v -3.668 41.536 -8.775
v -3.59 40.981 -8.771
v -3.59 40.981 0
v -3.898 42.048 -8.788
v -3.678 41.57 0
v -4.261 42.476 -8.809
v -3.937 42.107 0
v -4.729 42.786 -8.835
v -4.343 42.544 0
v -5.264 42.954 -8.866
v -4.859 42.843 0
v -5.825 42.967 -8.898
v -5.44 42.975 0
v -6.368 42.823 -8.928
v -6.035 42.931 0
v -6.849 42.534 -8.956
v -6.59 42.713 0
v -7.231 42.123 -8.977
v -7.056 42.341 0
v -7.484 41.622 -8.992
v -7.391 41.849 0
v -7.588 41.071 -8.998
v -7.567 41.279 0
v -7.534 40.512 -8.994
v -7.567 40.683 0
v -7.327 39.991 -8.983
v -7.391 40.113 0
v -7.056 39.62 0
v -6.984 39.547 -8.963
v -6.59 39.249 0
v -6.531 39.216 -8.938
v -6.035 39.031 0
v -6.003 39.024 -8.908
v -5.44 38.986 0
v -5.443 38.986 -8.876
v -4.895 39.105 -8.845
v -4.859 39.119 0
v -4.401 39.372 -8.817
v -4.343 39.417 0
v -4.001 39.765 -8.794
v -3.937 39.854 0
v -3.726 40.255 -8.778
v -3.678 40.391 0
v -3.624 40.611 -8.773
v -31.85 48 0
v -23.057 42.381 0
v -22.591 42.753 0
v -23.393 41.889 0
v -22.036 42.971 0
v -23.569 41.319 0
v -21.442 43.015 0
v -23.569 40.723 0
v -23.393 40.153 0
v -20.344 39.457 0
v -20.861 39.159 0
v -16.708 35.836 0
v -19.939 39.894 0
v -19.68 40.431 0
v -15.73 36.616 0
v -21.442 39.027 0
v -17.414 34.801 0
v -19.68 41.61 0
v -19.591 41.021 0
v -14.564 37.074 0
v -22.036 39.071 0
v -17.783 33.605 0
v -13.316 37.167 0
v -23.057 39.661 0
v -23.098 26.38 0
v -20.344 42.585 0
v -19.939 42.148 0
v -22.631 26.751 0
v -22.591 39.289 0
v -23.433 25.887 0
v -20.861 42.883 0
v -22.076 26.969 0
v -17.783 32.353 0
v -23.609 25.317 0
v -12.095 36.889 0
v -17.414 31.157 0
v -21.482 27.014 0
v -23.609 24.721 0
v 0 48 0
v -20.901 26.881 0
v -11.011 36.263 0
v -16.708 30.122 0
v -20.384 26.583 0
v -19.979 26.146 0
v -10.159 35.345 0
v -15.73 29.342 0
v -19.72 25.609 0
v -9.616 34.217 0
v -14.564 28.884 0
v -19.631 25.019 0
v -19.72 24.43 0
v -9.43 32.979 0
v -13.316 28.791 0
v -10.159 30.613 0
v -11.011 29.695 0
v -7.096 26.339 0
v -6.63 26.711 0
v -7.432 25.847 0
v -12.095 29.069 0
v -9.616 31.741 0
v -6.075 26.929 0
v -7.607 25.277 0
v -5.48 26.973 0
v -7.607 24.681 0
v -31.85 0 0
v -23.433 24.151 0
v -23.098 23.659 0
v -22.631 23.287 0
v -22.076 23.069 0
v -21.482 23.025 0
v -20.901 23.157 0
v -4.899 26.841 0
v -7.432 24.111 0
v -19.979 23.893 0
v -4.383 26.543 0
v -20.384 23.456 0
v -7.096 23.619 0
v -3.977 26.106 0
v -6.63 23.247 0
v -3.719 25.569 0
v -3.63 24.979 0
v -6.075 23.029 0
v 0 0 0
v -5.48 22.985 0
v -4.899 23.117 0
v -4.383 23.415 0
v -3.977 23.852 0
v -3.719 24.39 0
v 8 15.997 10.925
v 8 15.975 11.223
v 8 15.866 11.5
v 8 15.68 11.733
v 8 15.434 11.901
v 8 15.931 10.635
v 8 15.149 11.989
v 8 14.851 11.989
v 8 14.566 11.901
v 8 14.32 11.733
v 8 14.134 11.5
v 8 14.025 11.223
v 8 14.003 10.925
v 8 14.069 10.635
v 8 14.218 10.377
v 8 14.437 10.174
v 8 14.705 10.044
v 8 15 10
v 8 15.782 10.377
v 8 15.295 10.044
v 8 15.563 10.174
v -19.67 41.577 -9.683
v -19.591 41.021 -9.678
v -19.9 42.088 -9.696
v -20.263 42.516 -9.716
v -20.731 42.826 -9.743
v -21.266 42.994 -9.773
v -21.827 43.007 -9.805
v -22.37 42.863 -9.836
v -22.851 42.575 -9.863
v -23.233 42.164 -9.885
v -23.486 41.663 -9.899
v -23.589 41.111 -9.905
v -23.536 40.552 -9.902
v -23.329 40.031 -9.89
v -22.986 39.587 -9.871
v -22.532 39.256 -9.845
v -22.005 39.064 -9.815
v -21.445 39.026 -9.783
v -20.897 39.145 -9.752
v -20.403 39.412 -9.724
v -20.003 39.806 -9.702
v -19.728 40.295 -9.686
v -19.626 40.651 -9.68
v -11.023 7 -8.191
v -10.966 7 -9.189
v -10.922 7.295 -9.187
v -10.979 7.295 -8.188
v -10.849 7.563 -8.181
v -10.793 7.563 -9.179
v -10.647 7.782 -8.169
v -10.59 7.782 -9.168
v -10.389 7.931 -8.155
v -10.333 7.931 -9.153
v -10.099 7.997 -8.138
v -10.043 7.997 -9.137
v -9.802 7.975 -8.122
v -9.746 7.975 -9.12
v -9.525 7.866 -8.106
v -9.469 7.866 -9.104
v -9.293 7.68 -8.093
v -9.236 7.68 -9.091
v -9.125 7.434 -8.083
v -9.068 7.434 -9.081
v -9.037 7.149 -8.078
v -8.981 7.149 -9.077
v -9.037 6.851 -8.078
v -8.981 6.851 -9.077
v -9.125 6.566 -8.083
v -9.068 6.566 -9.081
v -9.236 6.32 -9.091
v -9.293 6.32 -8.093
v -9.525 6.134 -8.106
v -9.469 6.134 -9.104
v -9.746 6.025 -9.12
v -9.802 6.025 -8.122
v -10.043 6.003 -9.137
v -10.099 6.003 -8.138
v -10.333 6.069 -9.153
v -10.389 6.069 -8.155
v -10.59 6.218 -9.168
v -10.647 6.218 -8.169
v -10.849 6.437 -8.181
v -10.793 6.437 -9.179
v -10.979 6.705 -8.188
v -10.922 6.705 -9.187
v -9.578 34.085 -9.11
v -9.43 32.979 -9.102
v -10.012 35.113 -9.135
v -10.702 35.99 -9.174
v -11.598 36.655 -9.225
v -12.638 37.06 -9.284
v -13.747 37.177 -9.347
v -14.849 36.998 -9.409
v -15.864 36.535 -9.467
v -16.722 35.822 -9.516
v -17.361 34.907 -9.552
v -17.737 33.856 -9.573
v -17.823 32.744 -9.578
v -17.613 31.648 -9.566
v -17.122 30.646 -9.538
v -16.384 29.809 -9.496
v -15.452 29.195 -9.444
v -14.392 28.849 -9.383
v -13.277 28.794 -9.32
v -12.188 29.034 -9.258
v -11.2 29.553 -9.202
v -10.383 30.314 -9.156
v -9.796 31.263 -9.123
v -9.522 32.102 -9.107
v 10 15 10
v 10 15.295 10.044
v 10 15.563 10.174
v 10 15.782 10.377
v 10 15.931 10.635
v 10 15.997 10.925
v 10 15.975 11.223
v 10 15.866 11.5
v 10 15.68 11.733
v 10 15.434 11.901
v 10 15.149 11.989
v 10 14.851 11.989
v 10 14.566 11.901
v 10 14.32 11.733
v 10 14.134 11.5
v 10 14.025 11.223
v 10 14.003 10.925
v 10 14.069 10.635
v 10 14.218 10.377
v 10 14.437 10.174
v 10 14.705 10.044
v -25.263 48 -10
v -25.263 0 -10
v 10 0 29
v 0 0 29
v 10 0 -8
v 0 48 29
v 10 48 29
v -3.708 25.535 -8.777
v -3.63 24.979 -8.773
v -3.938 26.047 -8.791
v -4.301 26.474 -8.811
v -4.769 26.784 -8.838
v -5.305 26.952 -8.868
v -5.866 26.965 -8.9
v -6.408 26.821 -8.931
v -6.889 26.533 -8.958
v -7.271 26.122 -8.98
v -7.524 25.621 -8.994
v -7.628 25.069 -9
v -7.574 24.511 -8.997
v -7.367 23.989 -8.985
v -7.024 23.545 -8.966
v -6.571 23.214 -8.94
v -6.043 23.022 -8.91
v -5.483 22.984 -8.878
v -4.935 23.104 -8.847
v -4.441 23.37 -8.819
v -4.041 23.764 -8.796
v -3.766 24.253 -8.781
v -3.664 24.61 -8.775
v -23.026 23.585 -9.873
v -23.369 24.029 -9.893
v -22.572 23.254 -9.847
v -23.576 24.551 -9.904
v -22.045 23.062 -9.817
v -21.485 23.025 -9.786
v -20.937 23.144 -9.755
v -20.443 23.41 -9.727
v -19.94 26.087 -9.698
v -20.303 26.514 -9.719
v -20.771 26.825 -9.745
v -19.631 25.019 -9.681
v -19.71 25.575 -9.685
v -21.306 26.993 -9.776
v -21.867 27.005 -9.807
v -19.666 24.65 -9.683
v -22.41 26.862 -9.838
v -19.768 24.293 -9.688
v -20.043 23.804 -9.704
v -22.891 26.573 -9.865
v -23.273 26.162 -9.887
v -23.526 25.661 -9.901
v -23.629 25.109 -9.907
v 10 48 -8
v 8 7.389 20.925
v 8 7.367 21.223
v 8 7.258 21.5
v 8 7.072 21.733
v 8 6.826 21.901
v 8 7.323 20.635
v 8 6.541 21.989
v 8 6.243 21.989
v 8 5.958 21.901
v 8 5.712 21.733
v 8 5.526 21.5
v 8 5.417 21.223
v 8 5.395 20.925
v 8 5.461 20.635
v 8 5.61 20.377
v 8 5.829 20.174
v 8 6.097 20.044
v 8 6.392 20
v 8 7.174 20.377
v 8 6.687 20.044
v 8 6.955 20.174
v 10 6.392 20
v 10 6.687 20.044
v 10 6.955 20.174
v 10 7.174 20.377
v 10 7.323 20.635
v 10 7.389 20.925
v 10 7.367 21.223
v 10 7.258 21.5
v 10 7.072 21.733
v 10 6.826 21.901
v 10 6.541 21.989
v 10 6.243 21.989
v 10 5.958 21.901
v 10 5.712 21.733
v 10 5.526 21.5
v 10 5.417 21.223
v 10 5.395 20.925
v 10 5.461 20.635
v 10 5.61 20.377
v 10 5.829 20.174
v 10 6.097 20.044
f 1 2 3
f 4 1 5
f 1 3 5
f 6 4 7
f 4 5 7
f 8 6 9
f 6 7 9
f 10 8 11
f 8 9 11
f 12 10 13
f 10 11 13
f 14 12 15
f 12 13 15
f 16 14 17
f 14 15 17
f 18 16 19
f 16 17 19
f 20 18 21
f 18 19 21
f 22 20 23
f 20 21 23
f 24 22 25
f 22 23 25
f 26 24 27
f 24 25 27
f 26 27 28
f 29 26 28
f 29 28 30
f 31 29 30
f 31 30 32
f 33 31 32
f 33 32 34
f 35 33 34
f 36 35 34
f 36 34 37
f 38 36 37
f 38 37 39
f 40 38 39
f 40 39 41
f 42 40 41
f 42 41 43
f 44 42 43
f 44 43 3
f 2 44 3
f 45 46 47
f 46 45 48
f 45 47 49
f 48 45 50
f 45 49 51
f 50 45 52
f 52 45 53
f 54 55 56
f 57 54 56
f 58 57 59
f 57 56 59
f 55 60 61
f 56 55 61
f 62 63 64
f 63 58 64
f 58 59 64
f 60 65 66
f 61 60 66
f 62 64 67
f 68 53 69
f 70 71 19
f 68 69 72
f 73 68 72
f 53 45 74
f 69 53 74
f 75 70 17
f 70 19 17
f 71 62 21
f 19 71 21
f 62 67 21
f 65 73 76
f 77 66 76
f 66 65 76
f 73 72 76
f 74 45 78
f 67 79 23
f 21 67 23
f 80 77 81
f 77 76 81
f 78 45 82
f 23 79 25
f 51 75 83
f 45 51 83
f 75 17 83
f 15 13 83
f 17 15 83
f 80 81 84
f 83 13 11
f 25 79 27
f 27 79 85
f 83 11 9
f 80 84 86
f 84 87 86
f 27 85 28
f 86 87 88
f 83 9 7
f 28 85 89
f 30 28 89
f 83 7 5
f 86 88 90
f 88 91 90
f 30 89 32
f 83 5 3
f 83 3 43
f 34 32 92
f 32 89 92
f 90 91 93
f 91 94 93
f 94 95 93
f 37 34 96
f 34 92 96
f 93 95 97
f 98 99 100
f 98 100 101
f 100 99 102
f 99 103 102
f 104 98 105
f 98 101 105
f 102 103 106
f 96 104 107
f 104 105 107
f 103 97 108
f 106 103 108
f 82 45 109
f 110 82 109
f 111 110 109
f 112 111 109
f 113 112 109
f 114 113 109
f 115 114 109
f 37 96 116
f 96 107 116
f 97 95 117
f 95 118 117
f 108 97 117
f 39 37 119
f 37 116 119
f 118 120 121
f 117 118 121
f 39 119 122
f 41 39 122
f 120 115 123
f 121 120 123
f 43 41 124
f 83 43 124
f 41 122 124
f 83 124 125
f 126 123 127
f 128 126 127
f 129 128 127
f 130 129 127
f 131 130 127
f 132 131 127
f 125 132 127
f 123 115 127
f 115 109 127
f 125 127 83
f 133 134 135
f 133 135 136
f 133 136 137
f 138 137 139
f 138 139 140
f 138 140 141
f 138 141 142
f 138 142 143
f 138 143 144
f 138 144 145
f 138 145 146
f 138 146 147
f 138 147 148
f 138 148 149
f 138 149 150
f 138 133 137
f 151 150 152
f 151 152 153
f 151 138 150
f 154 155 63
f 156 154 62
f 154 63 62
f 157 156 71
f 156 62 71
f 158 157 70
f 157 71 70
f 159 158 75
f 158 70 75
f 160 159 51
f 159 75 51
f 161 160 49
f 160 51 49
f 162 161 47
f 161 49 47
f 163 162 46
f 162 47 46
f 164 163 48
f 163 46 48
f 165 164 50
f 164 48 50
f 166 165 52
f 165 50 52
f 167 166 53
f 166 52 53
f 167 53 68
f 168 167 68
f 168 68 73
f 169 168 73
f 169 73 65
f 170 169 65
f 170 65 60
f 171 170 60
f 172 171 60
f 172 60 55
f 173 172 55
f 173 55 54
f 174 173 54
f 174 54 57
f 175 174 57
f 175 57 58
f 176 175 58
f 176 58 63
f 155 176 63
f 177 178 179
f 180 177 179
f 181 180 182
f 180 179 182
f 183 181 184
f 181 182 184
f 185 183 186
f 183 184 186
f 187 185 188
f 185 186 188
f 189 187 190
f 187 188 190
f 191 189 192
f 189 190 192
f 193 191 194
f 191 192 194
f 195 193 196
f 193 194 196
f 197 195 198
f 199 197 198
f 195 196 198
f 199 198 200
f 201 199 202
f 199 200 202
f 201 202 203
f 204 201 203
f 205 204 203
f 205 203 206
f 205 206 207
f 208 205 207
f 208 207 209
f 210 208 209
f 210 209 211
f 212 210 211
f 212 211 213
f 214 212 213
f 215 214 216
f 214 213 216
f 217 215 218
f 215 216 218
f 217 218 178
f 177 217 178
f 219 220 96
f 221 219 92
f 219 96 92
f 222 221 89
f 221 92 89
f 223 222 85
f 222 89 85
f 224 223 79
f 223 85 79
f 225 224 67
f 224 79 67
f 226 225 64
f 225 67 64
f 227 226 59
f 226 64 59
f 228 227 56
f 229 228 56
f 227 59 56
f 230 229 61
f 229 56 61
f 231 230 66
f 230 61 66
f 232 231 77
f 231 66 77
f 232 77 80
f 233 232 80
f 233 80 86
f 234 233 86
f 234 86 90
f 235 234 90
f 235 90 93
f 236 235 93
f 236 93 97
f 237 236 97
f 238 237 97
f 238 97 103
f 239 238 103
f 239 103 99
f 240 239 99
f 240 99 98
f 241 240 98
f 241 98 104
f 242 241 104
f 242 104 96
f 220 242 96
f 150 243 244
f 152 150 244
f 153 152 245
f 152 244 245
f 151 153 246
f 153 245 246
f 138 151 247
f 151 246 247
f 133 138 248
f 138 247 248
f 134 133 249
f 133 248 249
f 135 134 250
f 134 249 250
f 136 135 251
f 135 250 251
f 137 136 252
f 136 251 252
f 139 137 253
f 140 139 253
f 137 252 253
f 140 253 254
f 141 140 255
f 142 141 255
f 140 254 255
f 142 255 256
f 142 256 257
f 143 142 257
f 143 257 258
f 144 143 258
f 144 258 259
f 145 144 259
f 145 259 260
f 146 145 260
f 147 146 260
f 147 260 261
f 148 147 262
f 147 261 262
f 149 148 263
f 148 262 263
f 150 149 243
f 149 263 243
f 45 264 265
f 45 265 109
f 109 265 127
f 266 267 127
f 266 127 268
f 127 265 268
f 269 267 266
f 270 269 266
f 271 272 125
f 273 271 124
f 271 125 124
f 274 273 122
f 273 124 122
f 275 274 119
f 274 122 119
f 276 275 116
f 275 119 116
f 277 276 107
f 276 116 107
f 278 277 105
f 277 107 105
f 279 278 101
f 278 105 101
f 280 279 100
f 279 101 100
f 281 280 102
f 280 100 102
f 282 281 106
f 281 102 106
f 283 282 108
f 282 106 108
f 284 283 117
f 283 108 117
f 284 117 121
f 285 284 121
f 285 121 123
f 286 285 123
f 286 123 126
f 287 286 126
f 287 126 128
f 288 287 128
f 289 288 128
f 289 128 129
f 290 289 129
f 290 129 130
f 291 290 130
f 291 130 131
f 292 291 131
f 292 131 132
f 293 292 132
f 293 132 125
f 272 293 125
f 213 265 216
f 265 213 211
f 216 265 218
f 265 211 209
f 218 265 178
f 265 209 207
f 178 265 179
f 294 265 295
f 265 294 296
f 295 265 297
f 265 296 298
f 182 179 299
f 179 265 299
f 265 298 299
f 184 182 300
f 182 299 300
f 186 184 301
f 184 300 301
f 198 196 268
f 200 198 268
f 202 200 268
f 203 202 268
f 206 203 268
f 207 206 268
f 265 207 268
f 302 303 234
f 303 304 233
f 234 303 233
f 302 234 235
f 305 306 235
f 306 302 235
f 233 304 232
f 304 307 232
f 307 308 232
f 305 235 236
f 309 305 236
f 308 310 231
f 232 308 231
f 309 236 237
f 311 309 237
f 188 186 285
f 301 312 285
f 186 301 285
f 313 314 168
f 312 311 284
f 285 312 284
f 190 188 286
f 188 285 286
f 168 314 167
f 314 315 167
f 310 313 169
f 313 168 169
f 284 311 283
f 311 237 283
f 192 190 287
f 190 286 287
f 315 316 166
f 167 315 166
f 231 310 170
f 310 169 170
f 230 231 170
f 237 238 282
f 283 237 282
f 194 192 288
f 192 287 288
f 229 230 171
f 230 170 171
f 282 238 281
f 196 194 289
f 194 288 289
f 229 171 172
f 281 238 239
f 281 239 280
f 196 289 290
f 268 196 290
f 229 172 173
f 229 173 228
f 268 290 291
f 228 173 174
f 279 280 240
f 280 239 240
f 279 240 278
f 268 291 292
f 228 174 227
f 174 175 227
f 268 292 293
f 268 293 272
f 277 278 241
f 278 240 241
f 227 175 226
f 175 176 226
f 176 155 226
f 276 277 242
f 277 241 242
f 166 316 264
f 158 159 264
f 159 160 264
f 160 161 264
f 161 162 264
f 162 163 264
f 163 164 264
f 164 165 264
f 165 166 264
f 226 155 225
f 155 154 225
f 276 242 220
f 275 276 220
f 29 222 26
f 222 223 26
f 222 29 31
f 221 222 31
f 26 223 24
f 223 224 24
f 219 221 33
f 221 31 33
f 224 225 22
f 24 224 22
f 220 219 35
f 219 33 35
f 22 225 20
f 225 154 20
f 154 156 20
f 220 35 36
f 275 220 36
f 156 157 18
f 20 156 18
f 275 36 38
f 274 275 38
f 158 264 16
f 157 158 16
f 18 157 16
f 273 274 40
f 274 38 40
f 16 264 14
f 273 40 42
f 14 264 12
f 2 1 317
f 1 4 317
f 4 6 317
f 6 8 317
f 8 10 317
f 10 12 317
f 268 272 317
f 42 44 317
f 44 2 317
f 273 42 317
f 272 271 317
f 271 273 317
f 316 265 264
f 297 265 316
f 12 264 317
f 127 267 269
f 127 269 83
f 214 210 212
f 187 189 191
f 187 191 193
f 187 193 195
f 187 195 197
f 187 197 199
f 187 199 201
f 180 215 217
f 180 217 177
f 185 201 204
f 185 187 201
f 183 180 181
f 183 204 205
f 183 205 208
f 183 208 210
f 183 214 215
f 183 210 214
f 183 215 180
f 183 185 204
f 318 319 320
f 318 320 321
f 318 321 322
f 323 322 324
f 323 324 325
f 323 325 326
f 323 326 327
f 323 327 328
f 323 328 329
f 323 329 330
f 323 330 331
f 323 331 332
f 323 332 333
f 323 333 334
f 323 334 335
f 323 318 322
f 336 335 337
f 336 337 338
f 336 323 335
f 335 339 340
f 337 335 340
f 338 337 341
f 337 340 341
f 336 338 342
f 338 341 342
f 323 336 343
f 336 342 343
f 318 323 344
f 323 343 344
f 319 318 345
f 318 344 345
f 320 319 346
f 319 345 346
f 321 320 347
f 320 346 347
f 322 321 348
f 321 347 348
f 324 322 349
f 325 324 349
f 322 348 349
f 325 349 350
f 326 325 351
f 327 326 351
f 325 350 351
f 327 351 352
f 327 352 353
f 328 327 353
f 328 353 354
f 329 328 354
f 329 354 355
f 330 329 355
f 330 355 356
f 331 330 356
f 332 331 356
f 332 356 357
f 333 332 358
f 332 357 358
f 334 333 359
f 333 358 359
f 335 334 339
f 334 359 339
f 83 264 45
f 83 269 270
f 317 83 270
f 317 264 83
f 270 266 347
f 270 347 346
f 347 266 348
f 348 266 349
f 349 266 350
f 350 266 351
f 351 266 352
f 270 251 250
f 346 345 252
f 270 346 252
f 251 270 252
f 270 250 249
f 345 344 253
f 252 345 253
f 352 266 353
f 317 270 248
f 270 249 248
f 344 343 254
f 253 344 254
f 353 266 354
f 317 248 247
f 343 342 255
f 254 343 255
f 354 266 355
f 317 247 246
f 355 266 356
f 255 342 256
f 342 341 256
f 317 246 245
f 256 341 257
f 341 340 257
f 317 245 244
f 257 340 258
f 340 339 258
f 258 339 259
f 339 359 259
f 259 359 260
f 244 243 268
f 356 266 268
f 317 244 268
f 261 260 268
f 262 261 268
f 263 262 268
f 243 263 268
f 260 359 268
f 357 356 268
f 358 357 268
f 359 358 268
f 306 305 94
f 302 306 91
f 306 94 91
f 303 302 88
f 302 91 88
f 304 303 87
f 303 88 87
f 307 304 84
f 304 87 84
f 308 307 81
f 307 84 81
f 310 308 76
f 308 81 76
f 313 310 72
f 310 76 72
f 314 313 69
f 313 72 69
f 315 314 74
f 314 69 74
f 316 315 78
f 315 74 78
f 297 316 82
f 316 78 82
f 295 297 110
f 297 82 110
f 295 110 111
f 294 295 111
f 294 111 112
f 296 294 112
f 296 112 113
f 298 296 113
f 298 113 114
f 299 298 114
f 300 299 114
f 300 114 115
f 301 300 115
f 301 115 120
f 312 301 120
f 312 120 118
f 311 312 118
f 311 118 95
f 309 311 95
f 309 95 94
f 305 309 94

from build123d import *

# Parameters (mm, degrees)
SKETCH1_W           = 41.85
SKETCH1_H           = 10
SKETCH1_W_2         = 10
SKETCH1_H_2         = 29
BOSS_EXTRUDE1_DEPTH = 48
CUT_EXTRUDE1_DEPTH  = 48
SKETCH4_R           = 2
SKETCH4_R_2         = 4.2
CUT_EXTRUDE2_DEPTH  = 48
CUT_EXTRUDE3_DEPTH  = 48
SKETCH6_R           = 1
CUT_EXTRUDE4_DEPTH  = 2
SKETCH7_R           = 1
CUT_EXTRUDE5_DEPTH  = 1


with BuildPart() as part:
    # Sketch1 → Boss-Extrude1 (new body)
    with BuildSketch(Plane(origin=(0, 0, 0), x_dir=(1, 0, 0), z_dir=(0, 1, 0))):
        with Locations((-10.925, 5)):
            Rectangle(SKETCH1_W, SKETCH1_H)
        with Locations((5, -14.5)):
            Rectangle(SKETCH1_W_2, SKETCH1_H_2)
    extrude(amount=BOSS_EXTRUDE1_DEPTH)

    # Sketch3 → Cut-Extrude1 (cut)
    with BuildSketch(Plane(origin=(0, 48, 0), x_dir=(1, 0, 0), z_dir=(0, 1, 0))):
        Polygon((-31.85, 10), (-25.26317425, 10), (-31.85, 0), align=None)
    extrude(amount=-CUT_EXTRUDE1_DEPTH, mode=Mode.SUBTRACT)

    # Sketch4 → Cut-Extrude2 (cut)
    with BuildSketch(Plane.XY):
        with Locations((-5.589559388, 40.980827232)):
            Circle(SKETCH4_R)
        with Locations((-5.629681083, 24.979051073)):
            Circle(SKETCH4_R)
        with Locations((-21.591335547, 41.020948927)):
            Circle(SKETCH4_R)
        with Locations((-21.631457243, 25.019172768)):
            Circle(SKETCH4_R)
        with Locations((-13.629681083, 32.979051073)):
            Circle(SKETCH4_R_2)
    extrude(amount=-CUT_EXTRUDE2_DEPTH, mode=Mode.SUBTRACT)

    # Sketch5 → Cut-Extrude3 (cut)
    with BuildSketch(Plane(origin=(0, 48, 0), x_dir=(1, 0, 0), z_dir=(0, 1, 0))):
        Polygon((-25.26317425, 10), (10, 8), (10, 10), align=None)
    extrude(amount=-CUT_EXTRUDE3_DEPTH, mode=Mode.SUBTRACT)

    # Sketch6 → Cut-Extrude4 (cut)
    with BuildSketch(Plane(origin=(10, 0, 0), x_dir=(0, 0, -1), z_dir=(1, 0, 0))):
        with Locations((-21, 6.391948522)):
            Circle(SKETCH6_R)
        with Locations((-11, 15)):
            Circle(SKETCH6_R)
    extrude(amount=-CUT_EXTRUDE4_DEPTH, mode=Mode.SUBTRACT)

    # Sketch7 → Cut-Extrude5 (cut)
    with BuildSketch(Plane(origin=(0.484340621, 0, -8.539693864), x_dir=(-0.9983954953921488, 0, -0.056625389894163713), z_dir=(0.056625389894163713, 0, -0.9983954953921488))):
        with Locations((10.469048165, 7)):
            Circle(SKETCH7_R)
    extrude(amount=-CUT_EXTRUDE5_DEPTH, mode=Mode.SUBTRACT)


solid = part.part
